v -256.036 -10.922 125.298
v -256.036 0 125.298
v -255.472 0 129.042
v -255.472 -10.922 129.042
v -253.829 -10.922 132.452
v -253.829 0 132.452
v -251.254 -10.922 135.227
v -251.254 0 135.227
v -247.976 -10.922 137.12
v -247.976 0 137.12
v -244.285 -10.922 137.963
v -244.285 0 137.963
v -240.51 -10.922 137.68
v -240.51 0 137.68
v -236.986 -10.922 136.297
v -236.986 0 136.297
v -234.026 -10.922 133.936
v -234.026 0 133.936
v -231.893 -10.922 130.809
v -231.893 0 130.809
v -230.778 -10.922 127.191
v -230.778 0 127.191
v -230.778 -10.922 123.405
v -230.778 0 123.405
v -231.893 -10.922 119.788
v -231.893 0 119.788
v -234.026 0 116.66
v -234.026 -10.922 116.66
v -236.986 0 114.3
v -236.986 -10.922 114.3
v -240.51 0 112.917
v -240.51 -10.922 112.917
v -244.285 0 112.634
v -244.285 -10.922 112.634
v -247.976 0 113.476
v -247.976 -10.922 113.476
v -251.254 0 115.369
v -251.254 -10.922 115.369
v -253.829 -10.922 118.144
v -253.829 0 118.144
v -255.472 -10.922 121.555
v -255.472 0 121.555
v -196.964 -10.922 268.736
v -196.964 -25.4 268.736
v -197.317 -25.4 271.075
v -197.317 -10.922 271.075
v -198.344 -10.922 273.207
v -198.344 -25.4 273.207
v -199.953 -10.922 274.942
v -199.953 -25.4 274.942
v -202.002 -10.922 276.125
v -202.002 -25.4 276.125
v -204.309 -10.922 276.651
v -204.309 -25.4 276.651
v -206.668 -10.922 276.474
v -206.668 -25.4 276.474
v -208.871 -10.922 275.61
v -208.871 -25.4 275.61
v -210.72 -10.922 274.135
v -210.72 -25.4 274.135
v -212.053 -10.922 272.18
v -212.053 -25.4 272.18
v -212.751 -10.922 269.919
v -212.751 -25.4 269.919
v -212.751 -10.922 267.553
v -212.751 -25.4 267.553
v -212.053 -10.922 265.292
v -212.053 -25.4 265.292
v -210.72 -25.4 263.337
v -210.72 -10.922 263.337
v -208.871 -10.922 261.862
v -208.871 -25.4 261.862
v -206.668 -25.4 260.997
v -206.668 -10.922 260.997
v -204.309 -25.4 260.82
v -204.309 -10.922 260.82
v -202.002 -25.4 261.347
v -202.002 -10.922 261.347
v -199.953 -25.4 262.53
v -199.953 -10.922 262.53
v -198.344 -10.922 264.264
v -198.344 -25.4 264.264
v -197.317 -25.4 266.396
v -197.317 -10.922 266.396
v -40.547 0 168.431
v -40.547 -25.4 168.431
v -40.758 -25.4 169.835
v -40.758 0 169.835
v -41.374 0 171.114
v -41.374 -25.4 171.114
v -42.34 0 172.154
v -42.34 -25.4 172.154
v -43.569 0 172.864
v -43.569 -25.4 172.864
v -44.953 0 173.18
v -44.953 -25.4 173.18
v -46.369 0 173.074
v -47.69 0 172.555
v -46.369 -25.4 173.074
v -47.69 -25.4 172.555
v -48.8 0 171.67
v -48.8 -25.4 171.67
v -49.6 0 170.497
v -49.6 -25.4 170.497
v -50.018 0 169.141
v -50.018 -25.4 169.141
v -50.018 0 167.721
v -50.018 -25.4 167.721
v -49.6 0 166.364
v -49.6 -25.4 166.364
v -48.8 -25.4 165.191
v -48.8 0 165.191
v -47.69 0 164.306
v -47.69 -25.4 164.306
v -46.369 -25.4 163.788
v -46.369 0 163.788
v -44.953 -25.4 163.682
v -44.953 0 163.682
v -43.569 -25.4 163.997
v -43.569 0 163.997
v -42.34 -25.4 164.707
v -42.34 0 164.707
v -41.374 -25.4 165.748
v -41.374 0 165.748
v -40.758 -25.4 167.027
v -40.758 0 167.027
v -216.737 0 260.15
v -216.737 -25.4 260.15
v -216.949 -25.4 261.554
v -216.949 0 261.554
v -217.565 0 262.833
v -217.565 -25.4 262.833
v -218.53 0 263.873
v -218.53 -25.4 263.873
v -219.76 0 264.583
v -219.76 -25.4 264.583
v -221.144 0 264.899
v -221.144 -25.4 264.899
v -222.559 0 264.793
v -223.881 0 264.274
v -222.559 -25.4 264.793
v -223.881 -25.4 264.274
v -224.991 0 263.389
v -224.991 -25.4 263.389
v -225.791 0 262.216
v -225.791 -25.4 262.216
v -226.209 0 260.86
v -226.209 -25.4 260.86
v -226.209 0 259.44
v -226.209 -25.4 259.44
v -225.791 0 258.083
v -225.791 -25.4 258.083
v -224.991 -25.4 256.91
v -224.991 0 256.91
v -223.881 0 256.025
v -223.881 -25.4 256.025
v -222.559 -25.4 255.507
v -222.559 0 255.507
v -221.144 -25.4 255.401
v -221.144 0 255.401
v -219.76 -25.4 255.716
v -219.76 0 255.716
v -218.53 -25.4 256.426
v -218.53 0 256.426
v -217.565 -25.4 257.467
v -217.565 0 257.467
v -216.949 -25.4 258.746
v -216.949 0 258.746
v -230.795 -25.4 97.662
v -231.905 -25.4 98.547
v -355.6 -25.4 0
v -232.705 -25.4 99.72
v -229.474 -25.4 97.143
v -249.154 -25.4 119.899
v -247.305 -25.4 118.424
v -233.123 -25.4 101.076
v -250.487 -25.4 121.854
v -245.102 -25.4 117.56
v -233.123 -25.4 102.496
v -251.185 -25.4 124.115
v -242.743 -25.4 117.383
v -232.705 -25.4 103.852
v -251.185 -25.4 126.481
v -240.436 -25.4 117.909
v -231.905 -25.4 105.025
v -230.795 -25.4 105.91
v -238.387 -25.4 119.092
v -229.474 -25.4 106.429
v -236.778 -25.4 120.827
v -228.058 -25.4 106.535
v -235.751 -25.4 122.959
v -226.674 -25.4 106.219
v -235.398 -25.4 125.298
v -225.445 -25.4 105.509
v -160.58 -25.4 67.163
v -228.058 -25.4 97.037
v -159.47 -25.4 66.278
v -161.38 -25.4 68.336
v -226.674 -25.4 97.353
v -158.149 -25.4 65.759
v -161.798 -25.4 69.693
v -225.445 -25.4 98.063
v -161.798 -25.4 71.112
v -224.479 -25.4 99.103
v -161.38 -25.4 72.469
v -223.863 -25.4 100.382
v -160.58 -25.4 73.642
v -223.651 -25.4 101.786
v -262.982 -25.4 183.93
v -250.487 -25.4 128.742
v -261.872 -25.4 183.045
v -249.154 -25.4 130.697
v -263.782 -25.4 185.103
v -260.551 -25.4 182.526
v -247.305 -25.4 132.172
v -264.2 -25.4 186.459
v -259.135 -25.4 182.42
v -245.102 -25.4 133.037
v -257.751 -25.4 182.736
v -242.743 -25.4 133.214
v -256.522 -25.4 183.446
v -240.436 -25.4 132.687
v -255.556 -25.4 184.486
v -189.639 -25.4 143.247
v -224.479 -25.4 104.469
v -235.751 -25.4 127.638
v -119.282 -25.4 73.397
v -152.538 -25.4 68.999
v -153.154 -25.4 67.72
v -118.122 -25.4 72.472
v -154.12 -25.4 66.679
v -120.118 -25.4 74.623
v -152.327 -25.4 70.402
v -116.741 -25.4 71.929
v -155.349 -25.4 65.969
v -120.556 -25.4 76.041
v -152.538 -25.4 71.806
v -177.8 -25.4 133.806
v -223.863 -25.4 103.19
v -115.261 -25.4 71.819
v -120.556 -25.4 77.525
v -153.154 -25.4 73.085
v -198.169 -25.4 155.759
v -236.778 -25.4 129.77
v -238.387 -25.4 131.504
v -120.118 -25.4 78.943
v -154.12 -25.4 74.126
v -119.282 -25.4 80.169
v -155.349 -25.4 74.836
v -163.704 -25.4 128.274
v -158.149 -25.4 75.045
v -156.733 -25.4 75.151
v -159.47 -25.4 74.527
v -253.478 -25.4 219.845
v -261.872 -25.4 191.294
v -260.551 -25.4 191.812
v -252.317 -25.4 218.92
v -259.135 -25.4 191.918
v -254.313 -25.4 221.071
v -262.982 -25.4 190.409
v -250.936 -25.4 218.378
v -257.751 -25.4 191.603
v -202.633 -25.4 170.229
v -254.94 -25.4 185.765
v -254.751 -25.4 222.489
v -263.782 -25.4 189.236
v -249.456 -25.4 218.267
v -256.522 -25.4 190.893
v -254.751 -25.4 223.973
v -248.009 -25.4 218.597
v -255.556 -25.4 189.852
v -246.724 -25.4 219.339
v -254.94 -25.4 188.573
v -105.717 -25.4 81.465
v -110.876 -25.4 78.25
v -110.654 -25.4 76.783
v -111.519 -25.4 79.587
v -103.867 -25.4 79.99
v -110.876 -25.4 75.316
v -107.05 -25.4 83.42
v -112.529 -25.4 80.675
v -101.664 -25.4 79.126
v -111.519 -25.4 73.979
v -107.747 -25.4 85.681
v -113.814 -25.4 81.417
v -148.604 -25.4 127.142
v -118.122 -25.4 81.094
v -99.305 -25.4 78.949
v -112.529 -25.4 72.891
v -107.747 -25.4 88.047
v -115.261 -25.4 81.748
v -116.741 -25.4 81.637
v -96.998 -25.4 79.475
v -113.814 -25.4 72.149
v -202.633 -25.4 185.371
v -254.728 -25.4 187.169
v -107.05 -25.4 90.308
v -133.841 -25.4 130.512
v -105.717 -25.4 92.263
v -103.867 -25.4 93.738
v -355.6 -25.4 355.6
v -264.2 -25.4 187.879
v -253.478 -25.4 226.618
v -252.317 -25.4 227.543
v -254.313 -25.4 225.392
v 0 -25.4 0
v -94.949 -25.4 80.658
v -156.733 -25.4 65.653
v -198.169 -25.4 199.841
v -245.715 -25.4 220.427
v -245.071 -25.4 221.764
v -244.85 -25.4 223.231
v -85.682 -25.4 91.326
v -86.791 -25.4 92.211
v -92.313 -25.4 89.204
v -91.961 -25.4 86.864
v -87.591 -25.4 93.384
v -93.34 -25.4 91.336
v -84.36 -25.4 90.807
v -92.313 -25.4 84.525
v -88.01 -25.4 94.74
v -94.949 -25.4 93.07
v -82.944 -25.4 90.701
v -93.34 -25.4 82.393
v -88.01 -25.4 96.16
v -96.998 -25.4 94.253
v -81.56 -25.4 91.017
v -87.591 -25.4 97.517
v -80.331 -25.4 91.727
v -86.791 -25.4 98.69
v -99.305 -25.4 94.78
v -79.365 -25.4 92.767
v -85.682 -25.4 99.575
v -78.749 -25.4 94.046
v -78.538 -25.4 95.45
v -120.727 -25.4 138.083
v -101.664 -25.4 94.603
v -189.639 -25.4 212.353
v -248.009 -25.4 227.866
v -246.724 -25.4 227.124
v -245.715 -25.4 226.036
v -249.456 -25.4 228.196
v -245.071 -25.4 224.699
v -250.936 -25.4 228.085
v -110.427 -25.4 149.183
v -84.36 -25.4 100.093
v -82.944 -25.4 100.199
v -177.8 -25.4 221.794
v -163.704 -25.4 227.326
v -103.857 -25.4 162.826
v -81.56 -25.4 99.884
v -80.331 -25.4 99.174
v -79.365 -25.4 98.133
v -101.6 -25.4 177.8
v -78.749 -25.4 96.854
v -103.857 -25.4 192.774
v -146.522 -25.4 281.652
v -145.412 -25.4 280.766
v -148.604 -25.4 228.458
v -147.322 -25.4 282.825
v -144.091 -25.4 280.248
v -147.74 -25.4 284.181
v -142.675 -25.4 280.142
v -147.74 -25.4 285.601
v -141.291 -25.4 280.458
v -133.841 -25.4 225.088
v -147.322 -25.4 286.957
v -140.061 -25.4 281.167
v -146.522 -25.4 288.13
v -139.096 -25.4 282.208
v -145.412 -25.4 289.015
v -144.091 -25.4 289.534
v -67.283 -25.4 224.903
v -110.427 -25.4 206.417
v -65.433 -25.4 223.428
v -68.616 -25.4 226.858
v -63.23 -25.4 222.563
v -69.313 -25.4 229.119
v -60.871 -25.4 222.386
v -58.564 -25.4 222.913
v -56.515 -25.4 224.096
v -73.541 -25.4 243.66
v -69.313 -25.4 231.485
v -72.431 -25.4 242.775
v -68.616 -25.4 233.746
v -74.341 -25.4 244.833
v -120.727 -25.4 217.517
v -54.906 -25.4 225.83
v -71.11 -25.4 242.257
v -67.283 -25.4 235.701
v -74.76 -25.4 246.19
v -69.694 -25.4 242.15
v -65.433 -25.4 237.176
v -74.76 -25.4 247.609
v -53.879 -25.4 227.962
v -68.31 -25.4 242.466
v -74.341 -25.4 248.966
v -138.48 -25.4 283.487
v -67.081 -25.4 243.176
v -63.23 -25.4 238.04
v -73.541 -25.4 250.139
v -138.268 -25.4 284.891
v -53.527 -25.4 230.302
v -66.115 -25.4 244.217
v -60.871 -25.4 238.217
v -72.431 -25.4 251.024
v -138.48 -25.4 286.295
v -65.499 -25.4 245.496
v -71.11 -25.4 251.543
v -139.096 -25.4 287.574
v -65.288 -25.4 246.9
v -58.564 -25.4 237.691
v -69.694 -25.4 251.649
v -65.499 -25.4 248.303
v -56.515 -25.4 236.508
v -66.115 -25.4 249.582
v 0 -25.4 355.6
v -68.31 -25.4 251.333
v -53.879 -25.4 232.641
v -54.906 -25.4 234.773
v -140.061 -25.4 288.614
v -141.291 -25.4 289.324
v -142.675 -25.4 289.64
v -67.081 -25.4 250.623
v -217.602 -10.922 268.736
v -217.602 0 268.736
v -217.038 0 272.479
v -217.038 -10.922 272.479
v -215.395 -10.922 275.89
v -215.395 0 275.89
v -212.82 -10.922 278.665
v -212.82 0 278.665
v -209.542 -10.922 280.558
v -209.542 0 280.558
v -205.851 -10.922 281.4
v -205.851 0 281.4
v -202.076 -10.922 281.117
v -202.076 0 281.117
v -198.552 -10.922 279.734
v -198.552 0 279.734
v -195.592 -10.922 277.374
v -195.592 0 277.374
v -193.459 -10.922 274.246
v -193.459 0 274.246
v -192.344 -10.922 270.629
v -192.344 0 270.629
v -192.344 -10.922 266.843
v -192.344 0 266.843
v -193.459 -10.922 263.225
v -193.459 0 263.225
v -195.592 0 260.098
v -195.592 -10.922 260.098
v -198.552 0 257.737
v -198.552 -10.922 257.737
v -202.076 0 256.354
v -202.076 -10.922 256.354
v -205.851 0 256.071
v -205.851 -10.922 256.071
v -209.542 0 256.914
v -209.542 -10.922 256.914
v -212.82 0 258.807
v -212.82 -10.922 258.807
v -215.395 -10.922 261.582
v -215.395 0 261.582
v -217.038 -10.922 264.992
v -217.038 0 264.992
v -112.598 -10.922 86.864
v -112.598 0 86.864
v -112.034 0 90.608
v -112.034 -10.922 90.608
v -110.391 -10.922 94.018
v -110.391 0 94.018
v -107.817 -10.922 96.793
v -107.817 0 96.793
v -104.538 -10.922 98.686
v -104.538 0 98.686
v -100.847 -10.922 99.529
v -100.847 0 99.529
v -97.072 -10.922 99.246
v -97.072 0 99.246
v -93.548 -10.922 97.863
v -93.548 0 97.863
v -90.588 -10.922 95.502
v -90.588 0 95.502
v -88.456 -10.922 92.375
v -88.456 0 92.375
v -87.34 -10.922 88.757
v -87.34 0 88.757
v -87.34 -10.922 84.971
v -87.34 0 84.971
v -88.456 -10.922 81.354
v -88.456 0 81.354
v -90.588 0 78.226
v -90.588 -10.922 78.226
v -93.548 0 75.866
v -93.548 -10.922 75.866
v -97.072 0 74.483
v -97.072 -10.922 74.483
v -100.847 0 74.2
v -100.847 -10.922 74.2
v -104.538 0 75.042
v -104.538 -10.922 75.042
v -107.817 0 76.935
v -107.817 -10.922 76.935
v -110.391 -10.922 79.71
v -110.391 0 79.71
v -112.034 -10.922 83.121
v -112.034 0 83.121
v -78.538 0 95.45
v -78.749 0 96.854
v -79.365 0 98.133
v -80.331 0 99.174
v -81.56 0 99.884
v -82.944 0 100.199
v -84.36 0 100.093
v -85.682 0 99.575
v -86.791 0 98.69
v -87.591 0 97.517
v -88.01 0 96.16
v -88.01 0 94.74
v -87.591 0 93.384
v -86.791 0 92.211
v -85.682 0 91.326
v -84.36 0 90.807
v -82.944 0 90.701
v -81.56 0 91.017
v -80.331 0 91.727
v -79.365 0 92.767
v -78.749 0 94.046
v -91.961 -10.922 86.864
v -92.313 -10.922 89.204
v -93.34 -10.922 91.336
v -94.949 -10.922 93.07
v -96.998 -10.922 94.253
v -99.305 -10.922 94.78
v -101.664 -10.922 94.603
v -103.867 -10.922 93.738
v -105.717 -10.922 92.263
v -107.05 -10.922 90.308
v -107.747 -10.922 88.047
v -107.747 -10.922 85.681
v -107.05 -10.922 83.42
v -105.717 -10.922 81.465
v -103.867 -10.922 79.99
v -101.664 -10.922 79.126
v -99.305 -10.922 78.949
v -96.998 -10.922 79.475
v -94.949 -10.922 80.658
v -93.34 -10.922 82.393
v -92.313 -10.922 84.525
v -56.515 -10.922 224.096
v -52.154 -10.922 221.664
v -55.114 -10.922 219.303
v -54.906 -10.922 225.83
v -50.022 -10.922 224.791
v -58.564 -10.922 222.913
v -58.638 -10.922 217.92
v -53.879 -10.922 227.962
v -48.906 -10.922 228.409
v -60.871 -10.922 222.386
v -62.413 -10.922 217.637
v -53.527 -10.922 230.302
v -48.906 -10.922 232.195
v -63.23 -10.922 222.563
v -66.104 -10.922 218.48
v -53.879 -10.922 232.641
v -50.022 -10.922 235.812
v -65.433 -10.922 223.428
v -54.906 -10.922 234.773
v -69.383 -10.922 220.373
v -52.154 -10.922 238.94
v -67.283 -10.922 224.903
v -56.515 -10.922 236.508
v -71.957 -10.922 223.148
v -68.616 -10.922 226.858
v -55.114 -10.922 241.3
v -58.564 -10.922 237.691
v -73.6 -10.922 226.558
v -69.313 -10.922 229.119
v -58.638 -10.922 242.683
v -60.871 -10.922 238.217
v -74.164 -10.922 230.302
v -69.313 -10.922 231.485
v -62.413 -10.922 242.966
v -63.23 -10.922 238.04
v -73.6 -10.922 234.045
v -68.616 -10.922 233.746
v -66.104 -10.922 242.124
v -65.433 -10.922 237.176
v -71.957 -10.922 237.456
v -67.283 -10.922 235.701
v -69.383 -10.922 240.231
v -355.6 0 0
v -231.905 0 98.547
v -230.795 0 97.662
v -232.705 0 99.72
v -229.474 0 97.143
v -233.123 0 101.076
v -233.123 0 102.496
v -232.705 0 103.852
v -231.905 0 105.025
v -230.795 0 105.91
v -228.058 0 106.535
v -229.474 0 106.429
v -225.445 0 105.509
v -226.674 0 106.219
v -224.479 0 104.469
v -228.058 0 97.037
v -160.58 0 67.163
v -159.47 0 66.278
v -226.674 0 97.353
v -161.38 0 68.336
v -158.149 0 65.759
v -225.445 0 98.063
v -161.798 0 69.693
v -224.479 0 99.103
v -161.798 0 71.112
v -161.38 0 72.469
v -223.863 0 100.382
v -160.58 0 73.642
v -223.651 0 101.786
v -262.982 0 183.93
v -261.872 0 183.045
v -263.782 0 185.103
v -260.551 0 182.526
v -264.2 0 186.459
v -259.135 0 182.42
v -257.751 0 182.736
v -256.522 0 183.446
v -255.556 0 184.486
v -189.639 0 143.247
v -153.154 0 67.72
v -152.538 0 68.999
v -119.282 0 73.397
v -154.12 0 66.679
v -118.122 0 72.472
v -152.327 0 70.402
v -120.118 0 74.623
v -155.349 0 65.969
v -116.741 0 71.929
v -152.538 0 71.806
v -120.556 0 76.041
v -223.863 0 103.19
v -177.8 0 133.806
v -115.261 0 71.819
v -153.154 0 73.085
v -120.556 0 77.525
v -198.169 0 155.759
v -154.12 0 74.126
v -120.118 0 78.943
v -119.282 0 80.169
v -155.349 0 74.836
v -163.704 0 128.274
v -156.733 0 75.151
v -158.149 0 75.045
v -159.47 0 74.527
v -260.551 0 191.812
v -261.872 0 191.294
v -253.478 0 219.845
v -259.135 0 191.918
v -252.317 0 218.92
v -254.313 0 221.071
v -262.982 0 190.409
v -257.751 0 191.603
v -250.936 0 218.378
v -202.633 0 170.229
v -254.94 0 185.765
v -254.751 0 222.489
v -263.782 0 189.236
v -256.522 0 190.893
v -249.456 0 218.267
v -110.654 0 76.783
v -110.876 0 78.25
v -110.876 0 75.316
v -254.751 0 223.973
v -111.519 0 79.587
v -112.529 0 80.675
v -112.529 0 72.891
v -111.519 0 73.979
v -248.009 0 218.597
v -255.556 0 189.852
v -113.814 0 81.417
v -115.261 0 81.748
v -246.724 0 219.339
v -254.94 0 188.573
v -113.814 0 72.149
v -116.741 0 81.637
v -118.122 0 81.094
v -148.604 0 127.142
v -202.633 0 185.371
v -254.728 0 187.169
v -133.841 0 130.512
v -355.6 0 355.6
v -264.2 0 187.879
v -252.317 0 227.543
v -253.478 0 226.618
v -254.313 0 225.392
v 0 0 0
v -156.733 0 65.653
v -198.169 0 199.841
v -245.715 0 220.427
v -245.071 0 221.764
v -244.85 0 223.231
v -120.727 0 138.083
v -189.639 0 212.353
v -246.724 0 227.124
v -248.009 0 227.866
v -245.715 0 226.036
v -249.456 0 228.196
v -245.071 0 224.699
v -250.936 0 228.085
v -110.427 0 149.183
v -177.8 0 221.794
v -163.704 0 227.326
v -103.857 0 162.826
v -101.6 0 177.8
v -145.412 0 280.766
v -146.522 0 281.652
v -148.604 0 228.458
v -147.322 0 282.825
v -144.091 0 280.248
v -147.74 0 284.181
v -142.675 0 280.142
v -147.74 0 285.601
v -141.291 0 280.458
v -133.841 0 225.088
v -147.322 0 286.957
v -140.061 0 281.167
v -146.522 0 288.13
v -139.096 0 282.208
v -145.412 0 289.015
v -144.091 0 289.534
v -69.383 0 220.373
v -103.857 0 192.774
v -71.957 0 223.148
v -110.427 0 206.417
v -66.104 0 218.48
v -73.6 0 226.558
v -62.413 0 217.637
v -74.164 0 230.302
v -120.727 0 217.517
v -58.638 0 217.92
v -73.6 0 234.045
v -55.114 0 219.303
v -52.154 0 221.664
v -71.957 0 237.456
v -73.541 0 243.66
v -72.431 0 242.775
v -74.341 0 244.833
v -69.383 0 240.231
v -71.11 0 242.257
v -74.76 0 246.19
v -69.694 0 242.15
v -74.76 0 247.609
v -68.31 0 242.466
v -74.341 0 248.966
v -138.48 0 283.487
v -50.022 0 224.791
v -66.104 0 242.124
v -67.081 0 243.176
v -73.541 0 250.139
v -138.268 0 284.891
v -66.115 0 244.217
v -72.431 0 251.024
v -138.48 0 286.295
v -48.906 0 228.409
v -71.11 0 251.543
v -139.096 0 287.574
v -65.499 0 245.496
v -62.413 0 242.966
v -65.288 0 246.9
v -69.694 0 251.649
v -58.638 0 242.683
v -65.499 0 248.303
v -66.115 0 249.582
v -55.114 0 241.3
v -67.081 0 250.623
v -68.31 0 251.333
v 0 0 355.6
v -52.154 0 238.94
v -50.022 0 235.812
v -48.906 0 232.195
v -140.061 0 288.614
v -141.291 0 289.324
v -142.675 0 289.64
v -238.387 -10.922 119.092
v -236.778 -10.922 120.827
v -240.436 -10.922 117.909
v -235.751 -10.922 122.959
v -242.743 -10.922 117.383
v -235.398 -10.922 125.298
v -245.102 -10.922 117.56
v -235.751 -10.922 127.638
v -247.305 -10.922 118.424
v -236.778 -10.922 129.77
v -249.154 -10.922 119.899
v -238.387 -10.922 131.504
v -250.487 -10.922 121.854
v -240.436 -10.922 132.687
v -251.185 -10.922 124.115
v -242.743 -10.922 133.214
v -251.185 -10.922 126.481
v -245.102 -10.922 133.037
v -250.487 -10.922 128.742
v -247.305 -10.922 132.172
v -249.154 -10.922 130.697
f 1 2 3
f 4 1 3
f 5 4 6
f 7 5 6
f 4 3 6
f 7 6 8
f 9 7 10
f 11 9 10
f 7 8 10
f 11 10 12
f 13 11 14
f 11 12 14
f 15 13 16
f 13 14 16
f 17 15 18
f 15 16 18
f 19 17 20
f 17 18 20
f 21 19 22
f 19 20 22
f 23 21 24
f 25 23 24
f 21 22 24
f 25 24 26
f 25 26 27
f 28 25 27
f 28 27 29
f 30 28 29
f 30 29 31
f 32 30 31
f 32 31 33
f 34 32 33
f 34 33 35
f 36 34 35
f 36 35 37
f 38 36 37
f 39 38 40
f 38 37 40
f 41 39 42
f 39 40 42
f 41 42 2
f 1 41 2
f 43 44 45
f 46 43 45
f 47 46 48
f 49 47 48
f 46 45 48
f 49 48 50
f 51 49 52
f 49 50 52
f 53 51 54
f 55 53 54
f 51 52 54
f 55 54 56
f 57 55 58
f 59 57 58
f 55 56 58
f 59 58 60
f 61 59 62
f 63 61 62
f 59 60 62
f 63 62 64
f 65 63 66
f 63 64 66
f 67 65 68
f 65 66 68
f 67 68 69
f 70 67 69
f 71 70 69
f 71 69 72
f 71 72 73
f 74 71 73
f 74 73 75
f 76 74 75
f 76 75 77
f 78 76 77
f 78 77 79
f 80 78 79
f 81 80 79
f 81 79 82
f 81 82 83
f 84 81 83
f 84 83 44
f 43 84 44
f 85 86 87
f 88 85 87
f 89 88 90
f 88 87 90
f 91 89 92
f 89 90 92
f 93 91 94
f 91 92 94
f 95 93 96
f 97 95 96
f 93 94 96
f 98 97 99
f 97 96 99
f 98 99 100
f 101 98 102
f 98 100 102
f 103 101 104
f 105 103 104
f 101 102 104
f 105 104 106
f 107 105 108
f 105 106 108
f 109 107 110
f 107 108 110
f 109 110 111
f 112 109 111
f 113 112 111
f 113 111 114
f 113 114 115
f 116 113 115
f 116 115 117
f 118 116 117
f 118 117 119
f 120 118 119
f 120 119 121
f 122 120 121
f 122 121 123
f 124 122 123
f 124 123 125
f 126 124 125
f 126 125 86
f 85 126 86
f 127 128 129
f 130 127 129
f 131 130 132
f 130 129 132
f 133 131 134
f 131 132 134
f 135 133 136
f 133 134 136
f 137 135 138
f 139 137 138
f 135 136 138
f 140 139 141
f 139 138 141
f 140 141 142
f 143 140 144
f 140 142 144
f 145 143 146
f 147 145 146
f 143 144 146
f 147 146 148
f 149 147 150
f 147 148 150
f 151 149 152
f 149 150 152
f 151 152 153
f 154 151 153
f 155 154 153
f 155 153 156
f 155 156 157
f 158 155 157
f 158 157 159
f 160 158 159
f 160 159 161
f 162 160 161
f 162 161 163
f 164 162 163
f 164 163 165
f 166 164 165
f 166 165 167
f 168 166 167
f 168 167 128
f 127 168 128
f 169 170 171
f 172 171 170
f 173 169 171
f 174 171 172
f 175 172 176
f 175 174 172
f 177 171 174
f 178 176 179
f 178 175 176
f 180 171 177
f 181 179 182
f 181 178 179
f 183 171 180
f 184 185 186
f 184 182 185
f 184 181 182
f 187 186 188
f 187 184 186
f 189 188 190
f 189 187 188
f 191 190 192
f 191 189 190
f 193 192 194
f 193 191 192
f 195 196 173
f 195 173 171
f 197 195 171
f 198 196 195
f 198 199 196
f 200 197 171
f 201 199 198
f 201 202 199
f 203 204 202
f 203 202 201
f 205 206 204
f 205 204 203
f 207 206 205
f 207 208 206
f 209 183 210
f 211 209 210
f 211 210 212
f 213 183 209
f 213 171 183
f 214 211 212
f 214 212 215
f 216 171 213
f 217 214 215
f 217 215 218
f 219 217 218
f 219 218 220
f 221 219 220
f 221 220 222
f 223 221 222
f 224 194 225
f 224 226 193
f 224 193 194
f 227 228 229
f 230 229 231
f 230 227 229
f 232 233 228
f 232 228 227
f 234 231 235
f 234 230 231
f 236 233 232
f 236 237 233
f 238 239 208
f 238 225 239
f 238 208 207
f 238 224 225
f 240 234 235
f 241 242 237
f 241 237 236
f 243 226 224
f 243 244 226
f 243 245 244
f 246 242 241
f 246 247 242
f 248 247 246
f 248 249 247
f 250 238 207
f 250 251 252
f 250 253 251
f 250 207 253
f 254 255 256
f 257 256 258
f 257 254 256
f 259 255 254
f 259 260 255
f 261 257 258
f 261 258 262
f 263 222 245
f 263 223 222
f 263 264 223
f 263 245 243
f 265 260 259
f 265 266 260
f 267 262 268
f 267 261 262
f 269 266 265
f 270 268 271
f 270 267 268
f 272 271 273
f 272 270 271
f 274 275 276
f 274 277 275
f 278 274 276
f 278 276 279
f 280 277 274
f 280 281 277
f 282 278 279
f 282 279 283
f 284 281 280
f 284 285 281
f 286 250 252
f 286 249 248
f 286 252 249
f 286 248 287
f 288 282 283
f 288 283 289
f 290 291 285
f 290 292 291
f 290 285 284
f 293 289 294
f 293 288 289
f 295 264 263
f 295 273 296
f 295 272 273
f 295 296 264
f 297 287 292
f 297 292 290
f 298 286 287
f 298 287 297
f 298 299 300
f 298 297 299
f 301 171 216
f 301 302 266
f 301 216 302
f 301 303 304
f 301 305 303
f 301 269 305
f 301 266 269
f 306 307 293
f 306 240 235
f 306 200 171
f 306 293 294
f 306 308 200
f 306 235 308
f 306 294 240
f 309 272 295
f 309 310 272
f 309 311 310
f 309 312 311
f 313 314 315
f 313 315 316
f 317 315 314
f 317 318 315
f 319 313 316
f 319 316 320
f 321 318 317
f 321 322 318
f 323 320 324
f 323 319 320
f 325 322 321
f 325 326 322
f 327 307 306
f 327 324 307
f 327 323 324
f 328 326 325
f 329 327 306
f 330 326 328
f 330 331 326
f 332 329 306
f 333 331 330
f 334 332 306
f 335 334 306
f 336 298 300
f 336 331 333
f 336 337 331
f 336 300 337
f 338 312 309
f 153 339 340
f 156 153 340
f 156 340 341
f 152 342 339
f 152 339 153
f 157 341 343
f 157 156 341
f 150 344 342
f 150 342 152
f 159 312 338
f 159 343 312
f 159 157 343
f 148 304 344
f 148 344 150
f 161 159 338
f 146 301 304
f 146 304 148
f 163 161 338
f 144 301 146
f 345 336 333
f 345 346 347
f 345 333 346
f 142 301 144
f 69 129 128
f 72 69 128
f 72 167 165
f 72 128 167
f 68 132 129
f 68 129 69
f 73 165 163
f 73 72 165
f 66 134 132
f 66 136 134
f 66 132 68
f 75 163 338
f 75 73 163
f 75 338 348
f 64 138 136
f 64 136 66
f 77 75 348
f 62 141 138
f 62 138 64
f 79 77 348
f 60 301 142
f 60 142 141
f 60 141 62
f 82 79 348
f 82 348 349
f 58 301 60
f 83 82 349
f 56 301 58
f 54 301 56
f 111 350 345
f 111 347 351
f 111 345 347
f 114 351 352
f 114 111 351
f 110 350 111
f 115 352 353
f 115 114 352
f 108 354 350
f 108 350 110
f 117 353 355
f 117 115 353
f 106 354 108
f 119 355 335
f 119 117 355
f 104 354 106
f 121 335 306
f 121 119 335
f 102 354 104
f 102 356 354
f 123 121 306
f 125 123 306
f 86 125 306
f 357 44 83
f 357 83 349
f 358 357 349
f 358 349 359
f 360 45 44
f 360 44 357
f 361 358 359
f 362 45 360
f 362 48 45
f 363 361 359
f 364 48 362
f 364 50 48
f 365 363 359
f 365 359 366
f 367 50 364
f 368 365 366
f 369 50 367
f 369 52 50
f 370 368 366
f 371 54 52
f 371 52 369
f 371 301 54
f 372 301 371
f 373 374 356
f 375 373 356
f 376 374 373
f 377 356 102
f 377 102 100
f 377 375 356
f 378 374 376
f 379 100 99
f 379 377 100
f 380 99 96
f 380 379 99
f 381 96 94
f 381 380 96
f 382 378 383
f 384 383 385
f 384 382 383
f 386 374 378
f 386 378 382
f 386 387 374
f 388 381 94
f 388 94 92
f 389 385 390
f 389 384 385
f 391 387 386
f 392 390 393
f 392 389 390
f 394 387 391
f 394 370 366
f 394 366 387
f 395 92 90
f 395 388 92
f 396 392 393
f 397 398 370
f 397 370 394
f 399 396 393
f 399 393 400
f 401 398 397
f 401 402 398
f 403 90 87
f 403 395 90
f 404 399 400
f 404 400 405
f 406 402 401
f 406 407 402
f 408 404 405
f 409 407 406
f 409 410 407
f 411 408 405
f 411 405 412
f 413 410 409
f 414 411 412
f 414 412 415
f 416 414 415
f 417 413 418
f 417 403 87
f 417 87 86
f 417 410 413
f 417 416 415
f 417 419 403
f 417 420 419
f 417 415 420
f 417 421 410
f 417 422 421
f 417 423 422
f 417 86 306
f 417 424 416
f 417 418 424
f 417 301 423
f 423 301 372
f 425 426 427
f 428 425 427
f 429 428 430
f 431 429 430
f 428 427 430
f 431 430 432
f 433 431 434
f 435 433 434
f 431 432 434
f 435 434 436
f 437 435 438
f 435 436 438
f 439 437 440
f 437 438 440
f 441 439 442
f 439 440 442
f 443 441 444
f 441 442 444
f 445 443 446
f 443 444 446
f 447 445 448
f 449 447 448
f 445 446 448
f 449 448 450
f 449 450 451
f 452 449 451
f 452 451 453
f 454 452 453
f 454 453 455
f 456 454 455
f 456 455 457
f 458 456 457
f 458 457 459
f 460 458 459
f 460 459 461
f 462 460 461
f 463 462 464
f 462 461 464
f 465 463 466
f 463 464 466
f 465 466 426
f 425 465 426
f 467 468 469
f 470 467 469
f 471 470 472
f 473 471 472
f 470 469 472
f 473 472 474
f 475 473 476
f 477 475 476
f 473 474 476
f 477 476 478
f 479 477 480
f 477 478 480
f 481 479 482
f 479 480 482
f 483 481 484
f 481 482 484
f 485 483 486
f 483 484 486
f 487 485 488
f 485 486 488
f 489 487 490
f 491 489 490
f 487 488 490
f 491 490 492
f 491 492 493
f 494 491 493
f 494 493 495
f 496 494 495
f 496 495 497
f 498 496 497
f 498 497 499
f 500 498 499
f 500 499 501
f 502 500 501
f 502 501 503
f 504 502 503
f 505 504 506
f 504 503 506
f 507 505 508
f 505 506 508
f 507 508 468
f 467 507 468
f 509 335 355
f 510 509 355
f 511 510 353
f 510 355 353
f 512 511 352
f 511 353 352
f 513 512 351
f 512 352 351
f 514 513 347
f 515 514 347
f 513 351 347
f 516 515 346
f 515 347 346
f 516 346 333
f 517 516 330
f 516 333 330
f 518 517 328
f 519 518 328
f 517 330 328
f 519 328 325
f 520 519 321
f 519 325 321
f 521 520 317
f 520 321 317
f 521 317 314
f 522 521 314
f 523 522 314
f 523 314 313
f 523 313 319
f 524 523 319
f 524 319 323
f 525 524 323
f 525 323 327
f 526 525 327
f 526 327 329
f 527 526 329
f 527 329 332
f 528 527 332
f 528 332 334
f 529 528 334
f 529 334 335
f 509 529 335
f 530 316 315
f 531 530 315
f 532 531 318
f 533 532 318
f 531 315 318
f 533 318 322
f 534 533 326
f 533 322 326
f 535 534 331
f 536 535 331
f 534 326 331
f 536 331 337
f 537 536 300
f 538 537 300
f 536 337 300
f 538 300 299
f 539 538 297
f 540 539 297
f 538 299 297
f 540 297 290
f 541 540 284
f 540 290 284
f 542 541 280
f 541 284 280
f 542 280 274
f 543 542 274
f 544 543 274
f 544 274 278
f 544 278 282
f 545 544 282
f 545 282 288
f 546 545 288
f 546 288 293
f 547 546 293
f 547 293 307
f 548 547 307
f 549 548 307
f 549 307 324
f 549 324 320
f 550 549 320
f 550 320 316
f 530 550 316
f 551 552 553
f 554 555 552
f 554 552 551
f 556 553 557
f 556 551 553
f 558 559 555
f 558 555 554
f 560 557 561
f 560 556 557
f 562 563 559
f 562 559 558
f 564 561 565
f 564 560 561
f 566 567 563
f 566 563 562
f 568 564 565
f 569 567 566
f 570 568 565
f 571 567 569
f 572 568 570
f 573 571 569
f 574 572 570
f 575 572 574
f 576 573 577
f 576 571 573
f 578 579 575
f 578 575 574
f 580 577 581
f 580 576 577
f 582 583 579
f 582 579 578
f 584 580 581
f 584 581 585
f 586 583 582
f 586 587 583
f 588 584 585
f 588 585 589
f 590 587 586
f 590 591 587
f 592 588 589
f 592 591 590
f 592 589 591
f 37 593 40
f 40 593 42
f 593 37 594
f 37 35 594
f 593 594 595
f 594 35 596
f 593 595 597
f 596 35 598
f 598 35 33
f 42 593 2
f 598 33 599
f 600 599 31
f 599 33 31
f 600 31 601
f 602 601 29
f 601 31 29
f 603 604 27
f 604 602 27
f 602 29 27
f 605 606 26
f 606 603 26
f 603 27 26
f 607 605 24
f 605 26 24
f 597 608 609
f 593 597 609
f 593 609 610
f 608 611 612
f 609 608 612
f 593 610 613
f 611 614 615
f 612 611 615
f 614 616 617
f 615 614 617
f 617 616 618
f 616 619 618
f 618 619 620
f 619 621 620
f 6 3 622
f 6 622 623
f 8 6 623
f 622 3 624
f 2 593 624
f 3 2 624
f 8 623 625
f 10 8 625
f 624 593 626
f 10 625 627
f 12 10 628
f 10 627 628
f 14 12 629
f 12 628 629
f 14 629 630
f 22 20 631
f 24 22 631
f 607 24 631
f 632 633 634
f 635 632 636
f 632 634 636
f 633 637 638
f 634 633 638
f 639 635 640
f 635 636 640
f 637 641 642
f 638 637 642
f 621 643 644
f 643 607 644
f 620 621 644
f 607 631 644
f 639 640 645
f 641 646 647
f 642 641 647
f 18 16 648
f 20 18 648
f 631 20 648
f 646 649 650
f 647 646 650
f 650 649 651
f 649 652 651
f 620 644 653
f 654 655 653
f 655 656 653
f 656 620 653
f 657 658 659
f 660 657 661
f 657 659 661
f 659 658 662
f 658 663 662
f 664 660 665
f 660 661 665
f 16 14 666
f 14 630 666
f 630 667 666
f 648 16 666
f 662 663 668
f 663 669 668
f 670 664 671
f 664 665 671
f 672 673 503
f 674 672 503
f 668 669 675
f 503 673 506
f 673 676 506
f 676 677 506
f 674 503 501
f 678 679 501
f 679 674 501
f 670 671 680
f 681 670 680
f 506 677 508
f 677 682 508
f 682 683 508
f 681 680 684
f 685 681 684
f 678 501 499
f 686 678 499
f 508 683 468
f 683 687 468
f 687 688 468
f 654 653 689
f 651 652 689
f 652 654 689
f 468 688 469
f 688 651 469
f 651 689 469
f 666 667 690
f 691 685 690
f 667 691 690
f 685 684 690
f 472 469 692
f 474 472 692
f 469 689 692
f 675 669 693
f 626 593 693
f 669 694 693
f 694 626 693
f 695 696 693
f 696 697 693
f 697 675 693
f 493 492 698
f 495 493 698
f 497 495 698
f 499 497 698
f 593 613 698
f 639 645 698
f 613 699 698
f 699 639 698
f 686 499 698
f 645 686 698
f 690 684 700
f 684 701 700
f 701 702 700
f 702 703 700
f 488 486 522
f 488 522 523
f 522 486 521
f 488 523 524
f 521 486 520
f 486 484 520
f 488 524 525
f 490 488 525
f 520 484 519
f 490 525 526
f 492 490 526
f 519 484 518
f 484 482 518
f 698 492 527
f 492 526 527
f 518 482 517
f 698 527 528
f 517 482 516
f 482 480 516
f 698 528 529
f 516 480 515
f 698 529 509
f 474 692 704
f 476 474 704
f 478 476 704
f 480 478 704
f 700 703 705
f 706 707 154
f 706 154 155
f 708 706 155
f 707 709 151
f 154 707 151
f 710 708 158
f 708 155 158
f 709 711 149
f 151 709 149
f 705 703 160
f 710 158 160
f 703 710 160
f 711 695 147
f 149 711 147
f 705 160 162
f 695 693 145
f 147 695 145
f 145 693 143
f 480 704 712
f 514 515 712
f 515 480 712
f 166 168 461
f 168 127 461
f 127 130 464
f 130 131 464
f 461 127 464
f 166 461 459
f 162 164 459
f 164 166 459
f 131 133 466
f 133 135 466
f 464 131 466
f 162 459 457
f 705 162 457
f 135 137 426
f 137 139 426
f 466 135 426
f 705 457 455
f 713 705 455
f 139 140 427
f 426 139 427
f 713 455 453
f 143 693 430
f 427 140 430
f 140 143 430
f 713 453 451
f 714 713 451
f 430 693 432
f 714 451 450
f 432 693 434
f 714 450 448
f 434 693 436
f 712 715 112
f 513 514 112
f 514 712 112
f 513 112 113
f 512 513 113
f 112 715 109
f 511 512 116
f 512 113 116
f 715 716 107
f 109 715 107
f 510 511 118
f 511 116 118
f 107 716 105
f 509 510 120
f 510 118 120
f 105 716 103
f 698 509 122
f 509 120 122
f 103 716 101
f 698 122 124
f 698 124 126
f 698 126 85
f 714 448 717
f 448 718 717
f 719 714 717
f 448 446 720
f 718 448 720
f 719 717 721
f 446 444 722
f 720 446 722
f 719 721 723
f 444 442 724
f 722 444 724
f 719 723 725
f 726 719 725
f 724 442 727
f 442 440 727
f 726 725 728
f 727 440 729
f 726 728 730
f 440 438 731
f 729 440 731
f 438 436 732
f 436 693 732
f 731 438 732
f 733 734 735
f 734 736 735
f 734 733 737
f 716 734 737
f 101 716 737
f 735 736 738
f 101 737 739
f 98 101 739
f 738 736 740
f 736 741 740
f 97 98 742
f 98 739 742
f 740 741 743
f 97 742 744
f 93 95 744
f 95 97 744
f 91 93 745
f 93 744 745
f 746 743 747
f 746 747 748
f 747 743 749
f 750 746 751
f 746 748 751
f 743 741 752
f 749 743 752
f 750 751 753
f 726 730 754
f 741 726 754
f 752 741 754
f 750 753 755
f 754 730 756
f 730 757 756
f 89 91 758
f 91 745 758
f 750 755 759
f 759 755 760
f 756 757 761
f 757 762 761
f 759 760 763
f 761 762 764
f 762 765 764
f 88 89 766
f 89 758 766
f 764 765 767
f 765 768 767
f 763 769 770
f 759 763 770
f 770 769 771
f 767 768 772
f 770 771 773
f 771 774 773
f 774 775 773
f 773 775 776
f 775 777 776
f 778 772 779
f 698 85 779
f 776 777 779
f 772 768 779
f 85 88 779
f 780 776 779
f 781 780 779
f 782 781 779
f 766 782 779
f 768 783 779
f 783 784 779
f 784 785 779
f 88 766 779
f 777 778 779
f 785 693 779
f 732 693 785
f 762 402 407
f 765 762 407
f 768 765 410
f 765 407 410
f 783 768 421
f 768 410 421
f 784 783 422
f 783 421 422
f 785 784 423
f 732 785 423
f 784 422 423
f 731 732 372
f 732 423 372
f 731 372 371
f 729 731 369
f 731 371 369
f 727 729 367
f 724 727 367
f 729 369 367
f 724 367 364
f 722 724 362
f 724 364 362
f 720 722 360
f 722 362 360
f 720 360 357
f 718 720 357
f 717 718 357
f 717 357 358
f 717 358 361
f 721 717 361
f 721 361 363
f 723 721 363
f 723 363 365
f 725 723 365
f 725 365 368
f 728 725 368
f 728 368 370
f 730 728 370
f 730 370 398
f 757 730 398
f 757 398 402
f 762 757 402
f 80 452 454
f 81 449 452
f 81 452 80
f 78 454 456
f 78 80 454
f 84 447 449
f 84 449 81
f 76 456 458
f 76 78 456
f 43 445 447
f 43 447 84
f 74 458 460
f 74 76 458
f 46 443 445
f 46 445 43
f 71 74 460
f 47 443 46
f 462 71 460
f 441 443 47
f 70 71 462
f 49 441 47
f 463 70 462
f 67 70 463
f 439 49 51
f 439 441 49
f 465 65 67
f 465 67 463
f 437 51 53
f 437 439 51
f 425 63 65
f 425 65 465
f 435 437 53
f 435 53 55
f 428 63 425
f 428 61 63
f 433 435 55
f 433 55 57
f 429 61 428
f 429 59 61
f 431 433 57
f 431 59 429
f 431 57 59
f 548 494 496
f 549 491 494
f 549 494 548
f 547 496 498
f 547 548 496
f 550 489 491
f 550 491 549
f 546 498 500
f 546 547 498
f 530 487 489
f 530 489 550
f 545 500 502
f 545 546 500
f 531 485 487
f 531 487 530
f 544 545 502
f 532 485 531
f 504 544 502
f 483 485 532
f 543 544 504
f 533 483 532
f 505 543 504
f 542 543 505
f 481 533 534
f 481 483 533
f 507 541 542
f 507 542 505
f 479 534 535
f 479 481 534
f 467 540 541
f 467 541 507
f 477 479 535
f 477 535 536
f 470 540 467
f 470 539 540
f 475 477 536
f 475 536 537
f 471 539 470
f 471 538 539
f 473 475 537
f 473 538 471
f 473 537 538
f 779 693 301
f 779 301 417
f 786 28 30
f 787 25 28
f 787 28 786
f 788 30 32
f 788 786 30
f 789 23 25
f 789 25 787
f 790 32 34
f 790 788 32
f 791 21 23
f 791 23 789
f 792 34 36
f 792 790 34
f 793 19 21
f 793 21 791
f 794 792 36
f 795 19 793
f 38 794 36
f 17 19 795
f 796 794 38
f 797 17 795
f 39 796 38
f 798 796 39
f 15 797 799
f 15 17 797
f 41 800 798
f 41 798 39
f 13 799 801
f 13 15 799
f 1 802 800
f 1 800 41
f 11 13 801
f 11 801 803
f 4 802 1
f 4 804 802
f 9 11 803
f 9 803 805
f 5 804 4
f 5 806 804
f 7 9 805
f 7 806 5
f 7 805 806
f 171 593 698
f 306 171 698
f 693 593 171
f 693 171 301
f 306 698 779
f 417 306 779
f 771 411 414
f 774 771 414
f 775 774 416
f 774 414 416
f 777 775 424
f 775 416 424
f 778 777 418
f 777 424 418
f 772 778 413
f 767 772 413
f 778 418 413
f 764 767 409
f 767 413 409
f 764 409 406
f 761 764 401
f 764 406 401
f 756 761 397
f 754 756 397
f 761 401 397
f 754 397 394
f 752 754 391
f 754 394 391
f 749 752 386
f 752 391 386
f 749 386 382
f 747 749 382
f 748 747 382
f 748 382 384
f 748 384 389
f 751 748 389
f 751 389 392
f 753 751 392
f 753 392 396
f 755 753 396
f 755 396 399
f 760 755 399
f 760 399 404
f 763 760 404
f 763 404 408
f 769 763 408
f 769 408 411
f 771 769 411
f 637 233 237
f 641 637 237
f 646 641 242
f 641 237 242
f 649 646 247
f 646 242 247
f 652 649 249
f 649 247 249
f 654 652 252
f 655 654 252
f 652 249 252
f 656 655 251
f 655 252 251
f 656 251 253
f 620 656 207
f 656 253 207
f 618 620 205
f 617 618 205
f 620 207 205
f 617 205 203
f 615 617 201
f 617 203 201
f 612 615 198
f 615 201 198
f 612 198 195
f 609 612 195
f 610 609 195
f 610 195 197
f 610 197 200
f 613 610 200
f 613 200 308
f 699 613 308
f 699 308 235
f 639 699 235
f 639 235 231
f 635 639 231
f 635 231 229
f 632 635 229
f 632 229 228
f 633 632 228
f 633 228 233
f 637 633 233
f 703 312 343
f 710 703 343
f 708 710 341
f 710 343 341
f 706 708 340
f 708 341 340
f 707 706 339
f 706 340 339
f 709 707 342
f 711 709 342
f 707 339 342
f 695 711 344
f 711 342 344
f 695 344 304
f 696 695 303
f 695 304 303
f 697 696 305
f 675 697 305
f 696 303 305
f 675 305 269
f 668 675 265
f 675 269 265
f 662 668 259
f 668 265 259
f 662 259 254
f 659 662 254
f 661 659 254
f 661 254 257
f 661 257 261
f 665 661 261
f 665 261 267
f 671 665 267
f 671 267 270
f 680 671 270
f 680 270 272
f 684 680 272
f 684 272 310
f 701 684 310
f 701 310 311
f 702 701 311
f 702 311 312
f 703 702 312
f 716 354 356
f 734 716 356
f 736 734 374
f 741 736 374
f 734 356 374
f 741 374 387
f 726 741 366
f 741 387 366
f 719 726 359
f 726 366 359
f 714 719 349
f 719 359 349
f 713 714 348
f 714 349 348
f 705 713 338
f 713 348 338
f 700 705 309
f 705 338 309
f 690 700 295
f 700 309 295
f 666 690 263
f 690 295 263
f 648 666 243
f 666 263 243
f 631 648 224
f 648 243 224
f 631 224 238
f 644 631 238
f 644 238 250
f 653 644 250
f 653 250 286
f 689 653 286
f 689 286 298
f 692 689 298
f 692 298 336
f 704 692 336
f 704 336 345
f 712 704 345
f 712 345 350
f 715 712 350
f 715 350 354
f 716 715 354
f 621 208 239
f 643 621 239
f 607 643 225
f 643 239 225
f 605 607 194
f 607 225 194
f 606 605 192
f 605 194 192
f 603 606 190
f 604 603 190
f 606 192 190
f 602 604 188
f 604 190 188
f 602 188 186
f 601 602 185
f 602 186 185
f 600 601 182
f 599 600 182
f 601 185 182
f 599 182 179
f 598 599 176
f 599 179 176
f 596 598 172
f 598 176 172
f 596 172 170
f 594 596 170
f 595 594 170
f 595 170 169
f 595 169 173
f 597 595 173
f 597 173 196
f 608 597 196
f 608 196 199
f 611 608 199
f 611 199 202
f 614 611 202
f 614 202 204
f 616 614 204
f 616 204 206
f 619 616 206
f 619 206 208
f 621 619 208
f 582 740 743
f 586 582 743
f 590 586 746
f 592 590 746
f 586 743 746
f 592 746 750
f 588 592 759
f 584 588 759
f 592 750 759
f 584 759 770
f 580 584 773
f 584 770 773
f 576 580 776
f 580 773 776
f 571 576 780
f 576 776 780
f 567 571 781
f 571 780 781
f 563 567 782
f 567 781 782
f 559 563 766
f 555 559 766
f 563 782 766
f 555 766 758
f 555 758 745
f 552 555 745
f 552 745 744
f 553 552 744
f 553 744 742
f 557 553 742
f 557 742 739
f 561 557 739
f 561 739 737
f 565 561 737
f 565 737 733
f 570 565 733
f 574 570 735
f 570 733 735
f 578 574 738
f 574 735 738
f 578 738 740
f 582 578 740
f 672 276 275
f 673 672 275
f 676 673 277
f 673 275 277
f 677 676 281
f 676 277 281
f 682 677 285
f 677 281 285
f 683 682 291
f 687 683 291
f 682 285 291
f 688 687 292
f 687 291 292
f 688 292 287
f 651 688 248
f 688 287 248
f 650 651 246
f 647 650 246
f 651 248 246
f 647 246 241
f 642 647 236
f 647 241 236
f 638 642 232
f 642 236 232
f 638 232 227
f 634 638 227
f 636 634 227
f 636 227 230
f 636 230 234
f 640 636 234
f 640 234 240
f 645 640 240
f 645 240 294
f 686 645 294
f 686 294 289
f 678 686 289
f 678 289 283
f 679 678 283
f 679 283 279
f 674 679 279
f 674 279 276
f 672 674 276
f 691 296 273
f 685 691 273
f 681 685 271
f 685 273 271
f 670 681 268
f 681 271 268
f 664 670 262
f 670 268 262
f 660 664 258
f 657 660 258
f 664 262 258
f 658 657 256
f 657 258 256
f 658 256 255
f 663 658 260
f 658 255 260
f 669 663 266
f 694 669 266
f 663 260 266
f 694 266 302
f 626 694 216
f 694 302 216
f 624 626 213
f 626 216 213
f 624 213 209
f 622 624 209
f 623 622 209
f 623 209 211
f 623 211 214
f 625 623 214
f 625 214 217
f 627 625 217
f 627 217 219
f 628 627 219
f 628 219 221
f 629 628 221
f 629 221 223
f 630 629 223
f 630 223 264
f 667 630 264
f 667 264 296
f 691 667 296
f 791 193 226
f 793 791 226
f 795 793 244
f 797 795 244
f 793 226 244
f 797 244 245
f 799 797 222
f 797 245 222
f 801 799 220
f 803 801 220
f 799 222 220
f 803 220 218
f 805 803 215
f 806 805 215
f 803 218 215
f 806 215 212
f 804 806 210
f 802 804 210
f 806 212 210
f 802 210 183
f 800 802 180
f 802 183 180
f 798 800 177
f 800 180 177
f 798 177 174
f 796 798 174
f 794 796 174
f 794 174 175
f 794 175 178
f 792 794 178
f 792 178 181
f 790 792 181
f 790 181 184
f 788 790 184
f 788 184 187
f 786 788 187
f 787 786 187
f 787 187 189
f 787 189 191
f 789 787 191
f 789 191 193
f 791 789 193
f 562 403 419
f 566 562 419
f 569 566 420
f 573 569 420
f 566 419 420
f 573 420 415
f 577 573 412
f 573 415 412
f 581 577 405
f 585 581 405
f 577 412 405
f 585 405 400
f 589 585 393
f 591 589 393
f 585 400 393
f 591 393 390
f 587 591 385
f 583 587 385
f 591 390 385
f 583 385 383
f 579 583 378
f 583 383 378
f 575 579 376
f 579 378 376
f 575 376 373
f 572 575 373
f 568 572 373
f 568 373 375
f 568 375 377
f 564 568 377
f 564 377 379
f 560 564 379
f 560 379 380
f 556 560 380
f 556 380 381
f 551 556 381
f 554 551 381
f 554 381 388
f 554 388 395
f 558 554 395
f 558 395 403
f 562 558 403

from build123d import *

# Parameters (mm, degrees)
F0_W     = 355.6
F0_H     = 355.6
F1_DEPTH = 25.4
F2_R     = 4.7625
F2_R_2   = 4.9784
F2_R_3   = 50.8
F3_DEPTH = 25.401
F4_R     = 7.9375
F5_DEPTH = 25.401
F6_R     = 12.7
F7_DEPTH = 10.922


with BuildPart() as f1:
    # F0 (on Front) → F1 (new body)
    with BuildSketch(Plane.XZ):
        with Locations((-177.8, 177.8)):
            Rectangle(F0_W, F0_H)
    extrude(amount=F1_DEPTH)

    # F2 (on face) → F3 (cut, through all)
    with BuildSketch(Plane.XZ.offset(25.4)):
        with Locations((-259.49093, 187.169242)):
            Circle(F2_R)
        with Locations((-221.499668, 260.149778)):
            Circle(F2_R)
        with Locations((-143.030758, 284.89093)):
            Circle(F2_R)
        with Locations((-70.050222, 246.899668)):
            Circle(F2_R)
        with Locations((-45.30907, 168.430758)):
            Circle(F2_R)
        with Locations((-83.300332, 95.450222)):
            Circle(F2_R)
        with Locations((-157.089084, 70.402316)):
            Circle(F2_R)
        with Locations((-228.413979, 101.786021)):
            Circle(F2_R)
        with Locations((-249.828087, 223.231463)):
            Circle(F2_R_2)
        with Locations((-115.632835, 76.783043)):
            Circle(F2_R_2)
        with Locations((-152.4, 177.8)):
            Circle(F2_R_3)
    extrude(amount=-F3_DEPTH, mode=Mode.SUBTRACT)

    # F4 (on face) → F5 (cut, through all)
    with BuildSketch(Plane.XZ.offset(25.4)):
        with Locations((-204.9018, 268.735785)):
            Circle(F4_R)
        with Locations((-243.335785, 125.2982)):
            Circle(F4_R)
        with Locations((-99.8982, 86.864215)):
            Circle(F4_R)
        with Locations((-61.464215, 230.3018)):
            Circle(F4_R)
    extrude(amount=-F5_DEPTH, mode=Mode.SUBTRACT)

    # F6 (on face) → F7 (cut)
    with BuildSketch(Plane(origin=(0, 0, 0), x_dir=(-1, 0, 0), z_dir=(0, 1, 0))):
        with Locations((204.9018, 268.735785)):
            Circle(F6_R)
        with Locations((243.335785, 125.2982)):
            Circle(F6_R)
        with Locations((99.8982, 86.864215)):
            Circle(F6_R)
        with Locations((61.464215, 230.3018)):
            Circle(F6_R)
    extrude(amount=-F7_DEPTH, mode=Mode.SUBTRACT)


solid = f1.part
